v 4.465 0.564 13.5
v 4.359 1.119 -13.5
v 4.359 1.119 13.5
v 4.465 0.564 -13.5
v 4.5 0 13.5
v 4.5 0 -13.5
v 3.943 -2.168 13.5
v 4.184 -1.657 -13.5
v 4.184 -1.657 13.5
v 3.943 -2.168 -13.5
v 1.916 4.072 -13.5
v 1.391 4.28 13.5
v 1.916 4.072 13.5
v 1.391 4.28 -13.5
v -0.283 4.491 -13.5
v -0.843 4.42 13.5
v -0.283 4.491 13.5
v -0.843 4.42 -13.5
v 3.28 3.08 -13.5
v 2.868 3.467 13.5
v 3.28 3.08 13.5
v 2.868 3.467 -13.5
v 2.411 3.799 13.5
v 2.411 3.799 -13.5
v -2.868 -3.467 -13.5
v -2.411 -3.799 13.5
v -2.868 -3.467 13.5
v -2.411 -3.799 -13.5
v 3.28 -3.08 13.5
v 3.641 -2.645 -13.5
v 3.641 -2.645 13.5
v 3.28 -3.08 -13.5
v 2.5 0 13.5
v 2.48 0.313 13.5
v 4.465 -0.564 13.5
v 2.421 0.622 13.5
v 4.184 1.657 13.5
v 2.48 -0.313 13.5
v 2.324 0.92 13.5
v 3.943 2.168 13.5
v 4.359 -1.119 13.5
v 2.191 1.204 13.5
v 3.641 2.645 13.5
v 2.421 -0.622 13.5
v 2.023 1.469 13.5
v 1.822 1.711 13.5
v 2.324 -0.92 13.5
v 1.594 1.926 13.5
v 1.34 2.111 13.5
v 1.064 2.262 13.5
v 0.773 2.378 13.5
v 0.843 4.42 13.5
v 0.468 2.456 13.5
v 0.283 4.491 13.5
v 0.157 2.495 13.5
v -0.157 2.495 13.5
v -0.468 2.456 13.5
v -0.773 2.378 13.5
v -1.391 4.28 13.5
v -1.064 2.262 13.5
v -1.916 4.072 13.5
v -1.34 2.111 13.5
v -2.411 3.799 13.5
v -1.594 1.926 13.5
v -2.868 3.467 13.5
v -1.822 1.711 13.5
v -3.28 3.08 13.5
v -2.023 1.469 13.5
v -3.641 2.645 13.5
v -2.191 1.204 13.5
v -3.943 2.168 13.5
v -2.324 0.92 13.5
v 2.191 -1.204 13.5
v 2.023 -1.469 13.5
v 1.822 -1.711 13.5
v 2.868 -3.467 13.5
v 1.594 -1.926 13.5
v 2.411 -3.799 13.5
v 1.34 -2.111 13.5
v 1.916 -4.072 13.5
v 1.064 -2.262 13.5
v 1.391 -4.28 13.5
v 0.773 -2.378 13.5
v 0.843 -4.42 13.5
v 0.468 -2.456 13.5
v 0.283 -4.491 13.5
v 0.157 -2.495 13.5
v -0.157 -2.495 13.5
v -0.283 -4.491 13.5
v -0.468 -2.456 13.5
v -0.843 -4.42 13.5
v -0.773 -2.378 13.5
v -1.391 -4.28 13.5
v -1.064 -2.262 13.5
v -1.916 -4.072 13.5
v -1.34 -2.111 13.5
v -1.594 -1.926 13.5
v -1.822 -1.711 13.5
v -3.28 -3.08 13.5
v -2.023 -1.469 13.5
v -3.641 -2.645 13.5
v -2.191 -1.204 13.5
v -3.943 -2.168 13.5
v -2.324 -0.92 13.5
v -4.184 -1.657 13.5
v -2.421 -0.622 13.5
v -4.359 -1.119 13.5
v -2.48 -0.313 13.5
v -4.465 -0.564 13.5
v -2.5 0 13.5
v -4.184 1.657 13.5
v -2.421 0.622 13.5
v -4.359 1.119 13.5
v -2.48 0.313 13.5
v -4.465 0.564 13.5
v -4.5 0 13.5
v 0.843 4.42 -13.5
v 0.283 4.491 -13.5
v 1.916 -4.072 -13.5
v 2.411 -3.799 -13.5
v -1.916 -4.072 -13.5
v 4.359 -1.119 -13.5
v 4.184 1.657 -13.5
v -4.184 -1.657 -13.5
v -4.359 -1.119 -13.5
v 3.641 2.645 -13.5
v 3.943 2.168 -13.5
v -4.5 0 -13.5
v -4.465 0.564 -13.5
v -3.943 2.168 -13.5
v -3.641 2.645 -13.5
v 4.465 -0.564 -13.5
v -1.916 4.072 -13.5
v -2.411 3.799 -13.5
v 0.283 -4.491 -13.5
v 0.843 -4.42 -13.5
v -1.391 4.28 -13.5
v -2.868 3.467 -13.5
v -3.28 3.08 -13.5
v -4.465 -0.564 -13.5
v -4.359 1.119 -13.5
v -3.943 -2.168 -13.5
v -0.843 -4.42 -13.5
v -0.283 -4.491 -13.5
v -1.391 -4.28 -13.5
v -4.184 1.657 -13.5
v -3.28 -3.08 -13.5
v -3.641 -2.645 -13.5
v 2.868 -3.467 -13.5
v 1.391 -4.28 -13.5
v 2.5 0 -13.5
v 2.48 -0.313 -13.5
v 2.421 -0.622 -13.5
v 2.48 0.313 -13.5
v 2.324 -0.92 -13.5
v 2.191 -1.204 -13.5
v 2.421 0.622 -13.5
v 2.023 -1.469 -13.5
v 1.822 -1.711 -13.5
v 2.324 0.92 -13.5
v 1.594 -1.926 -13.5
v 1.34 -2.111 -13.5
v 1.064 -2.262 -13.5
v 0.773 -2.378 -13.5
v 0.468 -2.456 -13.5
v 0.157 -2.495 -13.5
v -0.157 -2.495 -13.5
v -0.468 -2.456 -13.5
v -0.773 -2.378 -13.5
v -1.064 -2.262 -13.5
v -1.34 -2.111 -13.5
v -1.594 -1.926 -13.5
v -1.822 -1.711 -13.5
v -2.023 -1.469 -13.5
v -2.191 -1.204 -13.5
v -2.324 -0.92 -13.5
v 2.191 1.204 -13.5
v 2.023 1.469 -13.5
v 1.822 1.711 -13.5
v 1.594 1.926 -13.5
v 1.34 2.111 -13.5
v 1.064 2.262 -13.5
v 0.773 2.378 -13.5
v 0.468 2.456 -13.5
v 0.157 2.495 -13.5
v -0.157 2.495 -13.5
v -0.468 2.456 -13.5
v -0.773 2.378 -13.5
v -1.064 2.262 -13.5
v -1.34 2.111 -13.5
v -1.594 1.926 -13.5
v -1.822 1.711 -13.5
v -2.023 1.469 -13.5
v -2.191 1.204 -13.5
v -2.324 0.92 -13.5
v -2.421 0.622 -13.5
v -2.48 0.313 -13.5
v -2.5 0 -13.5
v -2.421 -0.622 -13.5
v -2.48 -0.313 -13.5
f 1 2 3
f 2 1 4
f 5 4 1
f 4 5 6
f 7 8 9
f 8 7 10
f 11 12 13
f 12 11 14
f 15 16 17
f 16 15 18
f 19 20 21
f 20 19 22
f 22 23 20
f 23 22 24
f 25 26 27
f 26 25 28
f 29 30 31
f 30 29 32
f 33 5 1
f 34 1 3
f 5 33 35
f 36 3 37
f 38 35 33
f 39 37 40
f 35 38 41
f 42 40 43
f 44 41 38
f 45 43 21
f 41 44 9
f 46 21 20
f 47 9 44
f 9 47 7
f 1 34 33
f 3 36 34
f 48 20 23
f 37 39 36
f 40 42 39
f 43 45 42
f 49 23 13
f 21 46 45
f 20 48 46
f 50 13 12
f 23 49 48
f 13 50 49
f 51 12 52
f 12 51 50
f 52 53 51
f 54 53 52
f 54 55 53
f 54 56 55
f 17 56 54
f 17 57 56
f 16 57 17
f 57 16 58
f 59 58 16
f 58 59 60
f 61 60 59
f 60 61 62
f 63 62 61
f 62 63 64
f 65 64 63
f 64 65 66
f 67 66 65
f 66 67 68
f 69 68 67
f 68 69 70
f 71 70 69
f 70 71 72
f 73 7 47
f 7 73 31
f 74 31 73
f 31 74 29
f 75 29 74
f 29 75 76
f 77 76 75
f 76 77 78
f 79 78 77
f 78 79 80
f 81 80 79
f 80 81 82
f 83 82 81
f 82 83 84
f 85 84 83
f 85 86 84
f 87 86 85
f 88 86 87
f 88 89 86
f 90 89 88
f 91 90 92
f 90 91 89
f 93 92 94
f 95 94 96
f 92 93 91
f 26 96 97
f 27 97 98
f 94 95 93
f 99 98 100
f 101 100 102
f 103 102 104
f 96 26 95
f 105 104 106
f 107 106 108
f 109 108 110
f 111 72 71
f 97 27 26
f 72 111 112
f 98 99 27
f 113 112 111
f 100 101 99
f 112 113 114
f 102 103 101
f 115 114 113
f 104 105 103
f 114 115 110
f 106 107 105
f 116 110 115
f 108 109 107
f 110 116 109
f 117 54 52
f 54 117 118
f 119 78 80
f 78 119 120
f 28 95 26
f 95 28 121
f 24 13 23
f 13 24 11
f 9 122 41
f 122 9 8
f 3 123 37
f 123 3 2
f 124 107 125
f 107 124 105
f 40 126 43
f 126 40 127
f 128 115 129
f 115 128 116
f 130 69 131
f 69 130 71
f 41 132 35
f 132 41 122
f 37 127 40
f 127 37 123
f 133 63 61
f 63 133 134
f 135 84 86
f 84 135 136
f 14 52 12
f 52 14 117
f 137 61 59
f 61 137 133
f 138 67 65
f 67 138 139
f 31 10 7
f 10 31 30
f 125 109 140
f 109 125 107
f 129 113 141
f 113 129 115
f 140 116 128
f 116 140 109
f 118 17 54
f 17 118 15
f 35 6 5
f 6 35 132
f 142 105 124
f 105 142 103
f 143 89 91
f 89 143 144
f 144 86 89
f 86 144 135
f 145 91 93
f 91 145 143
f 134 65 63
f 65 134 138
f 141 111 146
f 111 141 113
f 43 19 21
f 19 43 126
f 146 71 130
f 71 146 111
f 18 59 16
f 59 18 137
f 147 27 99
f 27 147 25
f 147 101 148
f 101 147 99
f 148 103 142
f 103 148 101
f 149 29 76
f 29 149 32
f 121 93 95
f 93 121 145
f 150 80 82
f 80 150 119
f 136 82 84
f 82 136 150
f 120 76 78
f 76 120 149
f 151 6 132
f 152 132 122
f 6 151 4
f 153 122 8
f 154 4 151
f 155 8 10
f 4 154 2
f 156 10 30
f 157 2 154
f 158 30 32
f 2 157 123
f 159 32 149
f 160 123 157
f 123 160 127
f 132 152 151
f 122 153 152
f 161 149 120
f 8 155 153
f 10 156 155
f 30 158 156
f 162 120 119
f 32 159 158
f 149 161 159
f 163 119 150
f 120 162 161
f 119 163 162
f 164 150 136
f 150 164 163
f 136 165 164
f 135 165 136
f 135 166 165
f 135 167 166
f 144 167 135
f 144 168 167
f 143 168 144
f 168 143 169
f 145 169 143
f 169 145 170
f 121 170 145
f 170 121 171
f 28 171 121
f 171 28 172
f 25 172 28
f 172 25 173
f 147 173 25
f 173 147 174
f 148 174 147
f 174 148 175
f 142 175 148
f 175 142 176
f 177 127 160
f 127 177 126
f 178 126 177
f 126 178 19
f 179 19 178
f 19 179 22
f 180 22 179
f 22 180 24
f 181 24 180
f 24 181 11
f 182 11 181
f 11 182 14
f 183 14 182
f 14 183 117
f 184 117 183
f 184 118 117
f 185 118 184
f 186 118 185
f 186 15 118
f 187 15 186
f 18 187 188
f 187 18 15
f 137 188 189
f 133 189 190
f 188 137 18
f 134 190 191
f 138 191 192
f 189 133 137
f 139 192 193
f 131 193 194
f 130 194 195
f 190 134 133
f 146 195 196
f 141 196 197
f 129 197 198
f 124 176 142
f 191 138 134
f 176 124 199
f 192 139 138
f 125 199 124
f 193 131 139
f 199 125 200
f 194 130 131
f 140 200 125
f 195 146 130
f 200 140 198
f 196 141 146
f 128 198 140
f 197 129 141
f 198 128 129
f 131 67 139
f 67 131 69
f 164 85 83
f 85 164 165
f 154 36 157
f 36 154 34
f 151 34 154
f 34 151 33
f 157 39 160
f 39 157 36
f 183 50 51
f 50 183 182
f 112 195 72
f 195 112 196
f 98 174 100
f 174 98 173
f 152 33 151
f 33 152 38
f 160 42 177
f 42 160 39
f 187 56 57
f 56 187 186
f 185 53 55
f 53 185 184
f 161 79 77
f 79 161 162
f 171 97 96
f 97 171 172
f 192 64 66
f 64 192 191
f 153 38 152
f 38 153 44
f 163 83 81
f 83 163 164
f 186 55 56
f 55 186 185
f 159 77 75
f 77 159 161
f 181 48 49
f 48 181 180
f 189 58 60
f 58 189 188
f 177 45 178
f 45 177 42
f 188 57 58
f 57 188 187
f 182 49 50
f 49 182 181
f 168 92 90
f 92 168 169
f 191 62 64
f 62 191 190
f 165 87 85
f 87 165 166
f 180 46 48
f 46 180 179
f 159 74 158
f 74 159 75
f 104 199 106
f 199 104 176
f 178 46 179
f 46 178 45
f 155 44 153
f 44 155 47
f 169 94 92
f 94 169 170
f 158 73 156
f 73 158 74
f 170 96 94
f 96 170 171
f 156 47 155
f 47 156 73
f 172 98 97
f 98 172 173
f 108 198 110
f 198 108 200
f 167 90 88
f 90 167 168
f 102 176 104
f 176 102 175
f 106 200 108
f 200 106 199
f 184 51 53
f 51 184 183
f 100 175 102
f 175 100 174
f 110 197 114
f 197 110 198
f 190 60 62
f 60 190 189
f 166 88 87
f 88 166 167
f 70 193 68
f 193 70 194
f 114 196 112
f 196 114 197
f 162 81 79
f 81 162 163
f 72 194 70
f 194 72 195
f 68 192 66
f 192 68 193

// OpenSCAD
$fn = 50;


difference() {
	union() {
		translate(v = [0, 0, -13.5000000000]) {
			cylinder(h = 27, r = 4.5000000000);
		}
	}
	union() {
		translate(v = [0, 0, -100.0000000000]) {
			cylinder(h = 200, r = 2.5000000000);
		}
	}
}
